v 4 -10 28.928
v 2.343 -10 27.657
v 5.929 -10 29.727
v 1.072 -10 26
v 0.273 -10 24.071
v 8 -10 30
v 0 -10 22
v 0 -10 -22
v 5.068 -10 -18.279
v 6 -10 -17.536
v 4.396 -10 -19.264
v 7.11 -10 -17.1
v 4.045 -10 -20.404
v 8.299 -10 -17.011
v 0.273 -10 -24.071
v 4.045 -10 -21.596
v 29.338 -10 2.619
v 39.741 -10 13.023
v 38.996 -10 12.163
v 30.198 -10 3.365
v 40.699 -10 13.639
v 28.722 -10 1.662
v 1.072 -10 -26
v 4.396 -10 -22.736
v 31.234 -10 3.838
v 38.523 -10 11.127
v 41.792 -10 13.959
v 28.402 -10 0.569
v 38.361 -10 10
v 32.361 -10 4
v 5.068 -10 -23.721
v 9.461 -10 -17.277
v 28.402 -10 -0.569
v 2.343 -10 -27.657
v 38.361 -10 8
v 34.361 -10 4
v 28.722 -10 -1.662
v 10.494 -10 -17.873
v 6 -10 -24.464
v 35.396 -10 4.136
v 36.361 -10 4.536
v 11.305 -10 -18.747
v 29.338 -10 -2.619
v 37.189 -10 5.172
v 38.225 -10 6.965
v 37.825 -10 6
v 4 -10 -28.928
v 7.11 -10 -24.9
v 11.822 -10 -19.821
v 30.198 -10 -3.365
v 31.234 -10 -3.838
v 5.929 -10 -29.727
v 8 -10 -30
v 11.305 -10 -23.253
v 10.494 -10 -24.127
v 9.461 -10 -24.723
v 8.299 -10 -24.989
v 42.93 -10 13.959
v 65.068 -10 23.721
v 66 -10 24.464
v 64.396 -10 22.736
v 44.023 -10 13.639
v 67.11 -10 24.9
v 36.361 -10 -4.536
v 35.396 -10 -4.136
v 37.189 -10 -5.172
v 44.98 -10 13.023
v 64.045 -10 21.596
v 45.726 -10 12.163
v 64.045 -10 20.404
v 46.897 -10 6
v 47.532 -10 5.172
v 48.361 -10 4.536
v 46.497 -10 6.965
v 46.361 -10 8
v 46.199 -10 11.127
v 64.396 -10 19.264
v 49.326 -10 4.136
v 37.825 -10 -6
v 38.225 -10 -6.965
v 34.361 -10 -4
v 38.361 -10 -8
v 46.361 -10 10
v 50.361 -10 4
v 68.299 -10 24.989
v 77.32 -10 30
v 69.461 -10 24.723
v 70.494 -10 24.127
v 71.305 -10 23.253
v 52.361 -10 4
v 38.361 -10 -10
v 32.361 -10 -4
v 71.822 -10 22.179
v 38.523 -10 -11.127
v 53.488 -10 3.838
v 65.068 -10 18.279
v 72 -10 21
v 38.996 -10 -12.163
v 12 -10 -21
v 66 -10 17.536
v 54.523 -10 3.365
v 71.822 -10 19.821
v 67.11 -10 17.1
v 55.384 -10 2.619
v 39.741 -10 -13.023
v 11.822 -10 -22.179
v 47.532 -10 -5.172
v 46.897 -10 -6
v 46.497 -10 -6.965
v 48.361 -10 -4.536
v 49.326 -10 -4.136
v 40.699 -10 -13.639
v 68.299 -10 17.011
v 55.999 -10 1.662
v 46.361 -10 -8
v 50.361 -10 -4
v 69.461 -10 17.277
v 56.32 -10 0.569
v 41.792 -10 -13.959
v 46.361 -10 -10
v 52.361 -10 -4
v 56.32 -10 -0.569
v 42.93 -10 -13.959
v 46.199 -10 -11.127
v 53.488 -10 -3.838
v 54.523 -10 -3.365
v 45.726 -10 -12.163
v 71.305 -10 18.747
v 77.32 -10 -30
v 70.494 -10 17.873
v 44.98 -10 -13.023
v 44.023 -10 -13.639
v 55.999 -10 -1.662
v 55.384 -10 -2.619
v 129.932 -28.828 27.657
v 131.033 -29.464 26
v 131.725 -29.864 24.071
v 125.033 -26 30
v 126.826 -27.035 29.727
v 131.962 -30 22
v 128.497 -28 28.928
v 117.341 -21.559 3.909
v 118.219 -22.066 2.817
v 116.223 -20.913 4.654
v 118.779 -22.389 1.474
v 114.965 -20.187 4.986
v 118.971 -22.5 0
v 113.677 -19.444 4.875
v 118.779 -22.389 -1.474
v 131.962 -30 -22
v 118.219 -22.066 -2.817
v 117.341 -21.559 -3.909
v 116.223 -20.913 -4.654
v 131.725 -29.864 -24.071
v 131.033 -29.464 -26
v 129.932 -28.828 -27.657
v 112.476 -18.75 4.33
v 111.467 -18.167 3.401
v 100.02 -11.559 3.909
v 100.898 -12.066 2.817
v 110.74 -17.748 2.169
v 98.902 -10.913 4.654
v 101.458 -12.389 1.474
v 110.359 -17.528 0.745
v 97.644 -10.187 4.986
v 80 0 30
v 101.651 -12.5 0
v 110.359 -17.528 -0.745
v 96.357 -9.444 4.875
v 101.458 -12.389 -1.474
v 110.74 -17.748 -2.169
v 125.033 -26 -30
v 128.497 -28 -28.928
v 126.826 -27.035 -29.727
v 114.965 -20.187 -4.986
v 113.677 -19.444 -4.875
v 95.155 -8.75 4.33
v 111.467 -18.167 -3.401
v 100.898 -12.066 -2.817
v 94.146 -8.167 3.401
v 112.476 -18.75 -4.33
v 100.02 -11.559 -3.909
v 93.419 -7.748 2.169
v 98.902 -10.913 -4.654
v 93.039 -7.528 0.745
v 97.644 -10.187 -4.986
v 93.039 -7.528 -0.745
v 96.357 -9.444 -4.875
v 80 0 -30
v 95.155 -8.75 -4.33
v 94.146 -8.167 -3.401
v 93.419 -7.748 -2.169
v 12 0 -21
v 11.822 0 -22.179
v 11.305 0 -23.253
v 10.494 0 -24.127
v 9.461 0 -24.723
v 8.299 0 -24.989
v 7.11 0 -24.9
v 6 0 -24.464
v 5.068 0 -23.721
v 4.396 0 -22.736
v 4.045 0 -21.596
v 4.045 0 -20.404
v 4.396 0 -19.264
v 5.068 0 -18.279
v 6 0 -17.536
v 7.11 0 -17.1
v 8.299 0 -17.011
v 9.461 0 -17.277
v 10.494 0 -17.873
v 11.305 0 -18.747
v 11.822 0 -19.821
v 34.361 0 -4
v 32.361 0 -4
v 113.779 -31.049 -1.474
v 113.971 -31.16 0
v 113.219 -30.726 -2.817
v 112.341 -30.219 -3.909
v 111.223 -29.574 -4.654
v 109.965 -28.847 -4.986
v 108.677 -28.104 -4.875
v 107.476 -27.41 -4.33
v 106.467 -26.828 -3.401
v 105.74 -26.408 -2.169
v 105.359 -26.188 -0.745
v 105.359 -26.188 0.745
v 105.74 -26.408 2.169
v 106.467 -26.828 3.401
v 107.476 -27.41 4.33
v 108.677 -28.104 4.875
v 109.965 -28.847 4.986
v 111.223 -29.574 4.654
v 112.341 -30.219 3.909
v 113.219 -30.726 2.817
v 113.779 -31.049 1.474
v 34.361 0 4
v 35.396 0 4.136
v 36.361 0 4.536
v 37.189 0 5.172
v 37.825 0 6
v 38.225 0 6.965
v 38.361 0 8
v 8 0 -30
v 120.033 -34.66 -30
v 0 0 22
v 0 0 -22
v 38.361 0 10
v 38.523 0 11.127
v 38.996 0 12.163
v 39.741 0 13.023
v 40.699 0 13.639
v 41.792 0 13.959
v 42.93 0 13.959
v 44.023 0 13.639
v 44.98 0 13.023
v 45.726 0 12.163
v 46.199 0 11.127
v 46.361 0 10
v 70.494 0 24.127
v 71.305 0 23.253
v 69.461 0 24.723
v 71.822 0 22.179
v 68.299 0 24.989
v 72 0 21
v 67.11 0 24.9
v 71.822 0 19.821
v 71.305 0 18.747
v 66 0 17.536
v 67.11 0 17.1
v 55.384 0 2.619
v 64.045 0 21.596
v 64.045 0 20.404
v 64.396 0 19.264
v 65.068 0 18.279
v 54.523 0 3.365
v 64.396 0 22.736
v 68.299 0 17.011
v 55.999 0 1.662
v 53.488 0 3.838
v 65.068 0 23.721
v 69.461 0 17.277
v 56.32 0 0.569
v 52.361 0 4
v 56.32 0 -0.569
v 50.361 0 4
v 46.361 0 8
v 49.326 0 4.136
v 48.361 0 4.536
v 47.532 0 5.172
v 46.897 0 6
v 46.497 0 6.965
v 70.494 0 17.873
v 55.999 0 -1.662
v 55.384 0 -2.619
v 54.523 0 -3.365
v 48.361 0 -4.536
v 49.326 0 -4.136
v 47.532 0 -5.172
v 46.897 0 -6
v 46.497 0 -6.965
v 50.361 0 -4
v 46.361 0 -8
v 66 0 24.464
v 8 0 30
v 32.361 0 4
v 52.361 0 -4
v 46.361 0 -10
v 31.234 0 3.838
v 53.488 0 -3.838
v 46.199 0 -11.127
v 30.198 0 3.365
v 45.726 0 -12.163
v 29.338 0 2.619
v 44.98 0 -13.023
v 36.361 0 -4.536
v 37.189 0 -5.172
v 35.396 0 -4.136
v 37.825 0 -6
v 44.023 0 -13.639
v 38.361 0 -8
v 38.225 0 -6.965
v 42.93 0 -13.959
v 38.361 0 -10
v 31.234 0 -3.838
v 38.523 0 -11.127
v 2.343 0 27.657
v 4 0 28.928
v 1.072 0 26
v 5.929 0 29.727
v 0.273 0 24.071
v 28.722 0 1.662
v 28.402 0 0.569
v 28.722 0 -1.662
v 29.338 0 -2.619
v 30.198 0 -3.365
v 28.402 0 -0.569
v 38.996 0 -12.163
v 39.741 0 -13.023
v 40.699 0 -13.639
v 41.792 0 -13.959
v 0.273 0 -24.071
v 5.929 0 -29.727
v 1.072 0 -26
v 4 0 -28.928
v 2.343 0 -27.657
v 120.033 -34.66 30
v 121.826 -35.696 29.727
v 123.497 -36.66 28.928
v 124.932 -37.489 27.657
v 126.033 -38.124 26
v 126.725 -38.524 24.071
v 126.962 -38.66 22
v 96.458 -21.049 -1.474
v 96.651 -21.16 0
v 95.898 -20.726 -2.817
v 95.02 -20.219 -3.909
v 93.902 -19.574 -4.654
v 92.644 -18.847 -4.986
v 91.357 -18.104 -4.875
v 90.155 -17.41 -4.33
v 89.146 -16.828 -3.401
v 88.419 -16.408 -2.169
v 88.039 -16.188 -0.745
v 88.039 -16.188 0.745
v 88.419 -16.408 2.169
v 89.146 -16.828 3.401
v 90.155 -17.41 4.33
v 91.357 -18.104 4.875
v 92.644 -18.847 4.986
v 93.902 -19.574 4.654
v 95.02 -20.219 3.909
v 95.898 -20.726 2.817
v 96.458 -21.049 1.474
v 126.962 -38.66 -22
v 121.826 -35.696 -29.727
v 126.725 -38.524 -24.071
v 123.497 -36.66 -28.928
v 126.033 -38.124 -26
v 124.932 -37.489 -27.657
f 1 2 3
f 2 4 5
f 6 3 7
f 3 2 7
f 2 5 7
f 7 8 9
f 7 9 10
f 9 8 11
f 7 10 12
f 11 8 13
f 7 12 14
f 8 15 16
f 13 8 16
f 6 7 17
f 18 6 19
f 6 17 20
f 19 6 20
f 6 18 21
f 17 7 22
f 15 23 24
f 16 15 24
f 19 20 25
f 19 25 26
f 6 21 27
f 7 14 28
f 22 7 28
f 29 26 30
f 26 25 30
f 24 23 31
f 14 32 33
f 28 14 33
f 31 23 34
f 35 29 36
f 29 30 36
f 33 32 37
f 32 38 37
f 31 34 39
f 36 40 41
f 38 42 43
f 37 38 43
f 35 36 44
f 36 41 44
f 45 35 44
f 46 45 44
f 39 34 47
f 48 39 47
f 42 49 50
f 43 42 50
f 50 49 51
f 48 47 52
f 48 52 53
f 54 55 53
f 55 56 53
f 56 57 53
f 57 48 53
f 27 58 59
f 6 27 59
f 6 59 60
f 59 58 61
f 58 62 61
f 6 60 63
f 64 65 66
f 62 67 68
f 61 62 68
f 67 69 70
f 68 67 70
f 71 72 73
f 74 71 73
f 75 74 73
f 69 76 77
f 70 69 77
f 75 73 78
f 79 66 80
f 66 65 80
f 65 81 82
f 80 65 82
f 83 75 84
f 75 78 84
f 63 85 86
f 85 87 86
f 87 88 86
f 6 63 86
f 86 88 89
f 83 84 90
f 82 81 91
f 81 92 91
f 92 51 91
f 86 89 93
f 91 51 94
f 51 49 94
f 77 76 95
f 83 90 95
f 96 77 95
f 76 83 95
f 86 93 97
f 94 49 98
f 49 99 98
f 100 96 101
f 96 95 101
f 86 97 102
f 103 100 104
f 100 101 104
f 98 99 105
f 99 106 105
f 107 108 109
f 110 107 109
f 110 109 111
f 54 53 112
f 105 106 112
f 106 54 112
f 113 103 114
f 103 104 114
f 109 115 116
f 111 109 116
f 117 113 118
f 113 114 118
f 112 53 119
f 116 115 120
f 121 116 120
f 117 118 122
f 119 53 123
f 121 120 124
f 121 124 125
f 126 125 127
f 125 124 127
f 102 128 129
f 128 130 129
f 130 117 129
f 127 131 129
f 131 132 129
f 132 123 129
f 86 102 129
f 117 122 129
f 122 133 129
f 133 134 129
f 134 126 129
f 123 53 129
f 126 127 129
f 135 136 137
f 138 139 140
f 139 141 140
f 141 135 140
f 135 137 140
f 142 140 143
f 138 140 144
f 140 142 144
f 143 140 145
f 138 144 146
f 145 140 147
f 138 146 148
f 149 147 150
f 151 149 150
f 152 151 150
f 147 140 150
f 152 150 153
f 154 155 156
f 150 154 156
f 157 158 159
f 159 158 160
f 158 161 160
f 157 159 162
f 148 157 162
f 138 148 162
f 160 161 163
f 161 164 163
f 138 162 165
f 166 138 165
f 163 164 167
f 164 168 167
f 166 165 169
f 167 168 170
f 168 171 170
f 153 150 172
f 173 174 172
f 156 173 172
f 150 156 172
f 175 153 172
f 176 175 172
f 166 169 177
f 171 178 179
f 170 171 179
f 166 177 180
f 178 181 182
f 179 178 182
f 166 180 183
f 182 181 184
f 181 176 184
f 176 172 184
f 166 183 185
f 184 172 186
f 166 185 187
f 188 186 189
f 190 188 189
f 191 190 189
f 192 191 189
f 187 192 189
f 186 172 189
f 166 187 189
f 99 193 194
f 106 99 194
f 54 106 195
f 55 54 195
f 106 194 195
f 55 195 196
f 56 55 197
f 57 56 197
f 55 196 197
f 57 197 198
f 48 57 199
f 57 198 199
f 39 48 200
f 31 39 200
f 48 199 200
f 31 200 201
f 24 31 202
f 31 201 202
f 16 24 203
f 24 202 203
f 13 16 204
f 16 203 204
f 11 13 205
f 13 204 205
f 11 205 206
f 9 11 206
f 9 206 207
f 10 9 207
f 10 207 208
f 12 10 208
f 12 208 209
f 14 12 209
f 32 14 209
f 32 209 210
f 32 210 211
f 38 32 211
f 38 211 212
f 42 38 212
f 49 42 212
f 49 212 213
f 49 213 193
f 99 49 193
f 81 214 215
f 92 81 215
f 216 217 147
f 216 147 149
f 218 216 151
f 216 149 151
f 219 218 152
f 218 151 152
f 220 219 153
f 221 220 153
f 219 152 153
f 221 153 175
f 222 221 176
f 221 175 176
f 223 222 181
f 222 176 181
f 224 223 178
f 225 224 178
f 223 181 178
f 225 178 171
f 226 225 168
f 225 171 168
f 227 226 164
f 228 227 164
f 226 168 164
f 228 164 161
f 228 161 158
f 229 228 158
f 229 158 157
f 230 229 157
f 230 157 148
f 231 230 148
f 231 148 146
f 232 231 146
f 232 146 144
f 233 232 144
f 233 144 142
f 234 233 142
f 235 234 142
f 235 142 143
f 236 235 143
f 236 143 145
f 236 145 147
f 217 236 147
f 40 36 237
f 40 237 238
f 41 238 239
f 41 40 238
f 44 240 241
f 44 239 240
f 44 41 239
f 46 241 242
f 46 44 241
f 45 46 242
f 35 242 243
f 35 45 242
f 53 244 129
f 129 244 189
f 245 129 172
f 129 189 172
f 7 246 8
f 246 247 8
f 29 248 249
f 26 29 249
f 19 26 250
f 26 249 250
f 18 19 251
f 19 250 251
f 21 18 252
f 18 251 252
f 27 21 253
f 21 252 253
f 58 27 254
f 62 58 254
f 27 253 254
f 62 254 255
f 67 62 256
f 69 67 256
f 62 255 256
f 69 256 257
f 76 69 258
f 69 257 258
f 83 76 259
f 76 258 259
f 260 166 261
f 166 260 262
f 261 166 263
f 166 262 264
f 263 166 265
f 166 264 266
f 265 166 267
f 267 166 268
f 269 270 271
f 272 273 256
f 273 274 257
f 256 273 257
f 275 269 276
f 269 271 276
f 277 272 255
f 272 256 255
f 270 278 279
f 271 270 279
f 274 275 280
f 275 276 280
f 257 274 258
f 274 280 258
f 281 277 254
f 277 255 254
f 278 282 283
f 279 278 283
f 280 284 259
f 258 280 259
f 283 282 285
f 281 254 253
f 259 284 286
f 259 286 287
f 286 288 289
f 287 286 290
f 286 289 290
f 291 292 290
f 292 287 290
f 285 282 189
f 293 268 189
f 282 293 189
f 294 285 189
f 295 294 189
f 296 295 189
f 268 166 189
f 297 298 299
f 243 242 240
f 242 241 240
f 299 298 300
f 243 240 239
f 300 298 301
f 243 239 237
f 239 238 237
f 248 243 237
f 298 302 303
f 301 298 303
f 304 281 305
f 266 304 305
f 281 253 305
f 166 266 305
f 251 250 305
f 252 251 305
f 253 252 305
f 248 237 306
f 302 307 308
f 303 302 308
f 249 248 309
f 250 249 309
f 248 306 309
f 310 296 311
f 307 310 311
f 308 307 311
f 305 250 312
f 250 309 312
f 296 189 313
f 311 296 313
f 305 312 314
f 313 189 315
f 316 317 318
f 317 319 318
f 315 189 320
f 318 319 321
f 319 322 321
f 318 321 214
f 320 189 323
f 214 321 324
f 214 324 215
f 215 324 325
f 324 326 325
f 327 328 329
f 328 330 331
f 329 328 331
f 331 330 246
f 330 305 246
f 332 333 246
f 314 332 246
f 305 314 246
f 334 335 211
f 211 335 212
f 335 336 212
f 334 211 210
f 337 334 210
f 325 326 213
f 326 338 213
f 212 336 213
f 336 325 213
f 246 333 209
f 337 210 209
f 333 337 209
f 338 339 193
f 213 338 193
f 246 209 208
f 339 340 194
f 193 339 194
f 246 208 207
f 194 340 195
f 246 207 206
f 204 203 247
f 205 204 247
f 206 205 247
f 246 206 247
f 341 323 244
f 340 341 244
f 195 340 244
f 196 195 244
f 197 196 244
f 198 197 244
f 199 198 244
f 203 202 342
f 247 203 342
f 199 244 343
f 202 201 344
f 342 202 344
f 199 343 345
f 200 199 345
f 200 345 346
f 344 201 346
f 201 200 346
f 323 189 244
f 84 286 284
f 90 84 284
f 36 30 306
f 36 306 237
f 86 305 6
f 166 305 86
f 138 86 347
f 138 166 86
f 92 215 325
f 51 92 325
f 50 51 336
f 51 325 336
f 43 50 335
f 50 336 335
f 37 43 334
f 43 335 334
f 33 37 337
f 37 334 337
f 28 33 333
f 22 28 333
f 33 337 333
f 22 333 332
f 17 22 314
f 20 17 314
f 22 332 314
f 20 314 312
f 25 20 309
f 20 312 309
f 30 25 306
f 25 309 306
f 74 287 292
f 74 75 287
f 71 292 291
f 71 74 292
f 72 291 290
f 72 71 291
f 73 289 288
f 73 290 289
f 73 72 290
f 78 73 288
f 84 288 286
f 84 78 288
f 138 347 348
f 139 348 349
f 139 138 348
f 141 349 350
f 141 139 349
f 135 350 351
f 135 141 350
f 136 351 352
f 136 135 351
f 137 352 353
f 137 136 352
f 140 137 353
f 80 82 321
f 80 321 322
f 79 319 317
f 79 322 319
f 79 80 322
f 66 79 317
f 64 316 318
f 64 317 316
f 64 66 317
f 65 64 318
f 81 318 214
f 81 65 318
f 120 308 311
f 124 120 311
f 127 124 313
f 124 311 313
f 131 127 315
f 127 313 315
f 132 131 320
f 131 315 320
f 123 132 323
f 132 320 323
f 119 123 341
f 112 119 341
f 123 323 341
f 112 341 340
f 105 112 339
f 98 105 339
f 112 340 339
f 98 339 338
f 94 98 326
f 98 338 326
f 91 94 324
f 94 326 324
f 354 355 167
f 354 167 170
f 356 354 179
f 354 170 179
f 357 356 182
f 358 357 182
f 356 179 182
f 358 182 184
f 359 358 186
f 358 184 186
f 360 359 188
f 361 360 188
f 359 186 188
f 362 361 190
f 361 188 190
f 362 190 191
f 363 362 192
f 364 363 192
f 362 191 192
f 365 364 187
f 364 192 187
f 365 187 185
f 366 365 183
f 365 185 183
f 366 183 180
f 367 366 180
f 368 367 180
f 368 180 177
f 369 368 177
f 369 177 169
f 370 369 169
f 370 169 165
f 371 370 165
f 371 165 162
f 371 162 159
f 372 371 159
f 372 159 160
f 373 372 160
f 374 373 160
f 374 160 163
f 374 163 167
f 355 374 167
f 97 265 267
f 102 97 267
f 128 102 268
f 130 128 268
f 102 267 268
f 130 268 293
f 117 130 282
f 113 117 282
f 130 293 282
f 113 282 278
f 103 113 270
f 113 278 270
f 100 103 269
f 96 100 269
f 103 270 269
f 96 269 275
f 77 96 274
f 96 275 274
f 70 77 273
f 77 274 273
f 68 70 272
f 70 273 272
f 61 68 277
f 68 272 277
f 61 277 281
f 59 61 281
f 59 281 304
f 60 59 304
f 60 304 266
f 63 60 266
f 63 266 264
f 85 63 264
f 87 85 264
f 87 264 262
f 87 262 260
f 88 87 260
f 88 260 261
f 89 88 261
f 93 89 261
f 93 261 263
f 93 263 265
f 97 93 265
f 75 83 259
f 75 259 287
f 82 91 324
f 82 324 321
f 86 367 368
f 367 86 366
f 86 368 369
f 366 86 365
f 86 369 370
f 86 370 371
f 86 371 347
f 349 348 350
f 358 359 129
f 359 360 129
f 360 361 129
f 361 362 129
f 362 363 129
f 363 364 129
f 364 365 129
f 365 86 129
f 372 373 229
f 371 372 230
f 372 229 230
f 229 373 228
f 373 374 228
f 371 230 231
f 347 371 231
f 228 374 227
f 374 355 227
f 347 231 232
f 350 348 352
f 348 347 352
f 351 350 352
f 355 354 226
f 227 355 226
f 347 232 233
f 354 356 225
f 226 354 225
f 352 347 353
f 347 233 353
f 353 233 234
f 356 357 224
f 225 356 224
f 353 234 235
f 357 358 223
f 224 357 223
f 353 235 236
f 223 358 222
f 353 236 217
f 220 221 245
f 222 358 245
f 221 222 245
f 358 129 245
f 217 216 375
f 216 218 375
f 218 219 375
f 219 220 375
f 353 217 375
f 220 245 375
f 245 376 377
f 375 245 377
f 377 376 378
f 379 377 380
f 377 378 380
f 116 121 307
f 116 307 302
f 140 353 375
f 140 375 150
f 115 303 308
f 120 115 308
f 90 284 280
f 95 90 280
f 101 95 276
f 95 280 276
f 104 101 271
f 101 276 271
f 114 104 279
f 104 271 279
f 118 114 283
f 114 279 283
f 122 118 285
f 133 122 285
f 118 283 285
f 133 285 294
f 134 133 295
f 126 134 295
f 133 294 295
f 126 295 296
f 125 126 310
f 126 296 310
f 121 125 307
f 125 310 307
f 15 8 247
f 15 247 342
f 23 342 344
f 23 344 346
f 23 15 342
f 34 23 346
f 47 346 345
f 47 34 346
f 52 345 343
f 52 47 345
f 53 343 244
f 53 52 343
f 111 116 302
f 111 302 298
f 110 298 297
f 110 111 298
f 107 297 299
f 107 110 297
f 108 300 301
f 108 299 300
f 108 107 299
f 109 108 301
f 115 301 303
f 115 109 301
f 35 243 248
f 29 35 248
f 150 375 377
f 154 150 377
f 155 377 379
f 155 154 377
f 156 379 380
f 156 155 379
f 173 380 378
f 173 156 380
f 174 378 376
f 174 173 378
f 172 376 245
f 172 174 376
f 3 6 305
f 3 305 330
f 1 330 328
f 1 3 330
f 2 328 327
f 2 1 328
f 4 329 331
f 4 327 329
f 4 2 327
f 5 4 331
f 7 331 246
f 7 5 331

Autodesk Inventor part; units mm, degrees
ref_plane "YZ Plane" through (0, 0, 0) normal (1, 0, 0) x (0, 1, 0)
ref_plane "XZ Plane" through (0, 0, 0) normal (0, 1, 0) x (-1, 0, 0)
ref_plane "XY Plane" through (0, 0, 0) normal (0, 0, 1) x (1, 0, 0)
sketch "스케치1" plane through (0, 0, 0) normal (0, 0, 1) x (1, 0, 0)
  line L0 (0, 0) -> (0, -10)
  line L1 (0, -10) -> (77.3205, -10)
  line L2 (77.3205, -10) -> (126.9615, -38.6603)
  line L3 (126.9615, -38.6603) -> (131.9615, -30)
  line L4 (131.9615, -30) -> (80, 0)
  line L5 (80, 0) -> (0, 0)
  dimension "d0" = 10
  dimension "d1" = 80
  dimension "d2" = 60
  dimension "d4" = 150
  dimension "d5" = 10
extrude "돌출1" add sketch "스케치1" along normal mid plane 60
fillet "모깎기1" radius 8 2 edges at (0, -5, 30) (0, -5, -30)
fillet "모깎기2" radius 8 2 edges at (129.4615, -34.3301, 30) (129.4615, -34.3301, -30)
sketch "스케치2" plane through (80, 0, 30) normal (0.5, 0.866, 0) x (0.866, -0.5, 0)
  circle A0 centre (20, 30) radius 5
  circle A1 centre (40, 30) radius 5
  line L0 (60, 52) -> (60, 8) projected
  line L1 (52, 0) -> (0, 0) projected
  point P0 (-69.282, 30)
  dimension "d10" = 10
  dimension "d11" = 10
  dimension "d12" = 20
  dimension "d13" = 20
  dimension "d14" = 30
  dimension "d15" = 30
extrude "돌출2" cut sketch "스케치2" against normal blind 60
sketch "스케치3" plane through (80, 0, 30) normal (0, 1, 0) x (1, 0, 0)
  line L0 (-47.6391, 30) -> (-27.6391, 30) construction
  line L1 (-47.6391, 26) -> (-27.6391, 26)
  line L2 (-27.6391, 34) -> (-47.6391, 34)
  arc A0 (-47.6391, 34) -> (-47.6391, 26) centre (-47.6391, 30) ccw
  arc A1 (-27.6391, 26) -> (-27.6391, 34) centre (-27.6391, 30) ccw
  line L3 (-37.6391, 40) -> (-37.6391, 20) construction
  line L4 (-41.6391, 40) -> (-41.6391, 20)
  line L5 (-33.6391, 20) -> (-33.6391, 40)
  arc A2 (-33.6391, 40) -> (-41.6391, 40) centre (-37.6391, 40) ccw
  arc A3 (-41.6391, 20) -> (-33.6391, 20) centre (-37.6391, 20) ccw
  line L6 (-72, 60) -> (0, 60) projected
  circle A4 centre (-72, 51) radius 4
  circle A5 centre (-12, 9) radius 4
  point P0 (-80, 30)
  point P1 (-37.6391, 30)
  point P2 (-37.6391, 30)
  point P3 (-41.6391, 26)
  point P4 (-33.6391, 26)
  point P5 (-33.6391, 34)
  point P6 (-41.6391, 34)
  dimension "d18" = 20
  dimension "d19" = 20
  dimension "d20" = 30
  dimension "d21" = 30
  dimension "d22" = 8
  dimension "d23" = 8
  dimension "d24" = 60
  dimension "d25" = 42
  dimension "d26" = 9
  dimension "d28" = 8
  dimension "d29" = 8
extrude "돌출3" cut sketch "스케치3" against normal blind 60
fillet "모깎기3" radius 4 4 edges at (38.3609, -5, -4) (38.3609, -5, 4) (46.3609, -5, 4) (46.3609, -5, -4)
properties part number "2번"
